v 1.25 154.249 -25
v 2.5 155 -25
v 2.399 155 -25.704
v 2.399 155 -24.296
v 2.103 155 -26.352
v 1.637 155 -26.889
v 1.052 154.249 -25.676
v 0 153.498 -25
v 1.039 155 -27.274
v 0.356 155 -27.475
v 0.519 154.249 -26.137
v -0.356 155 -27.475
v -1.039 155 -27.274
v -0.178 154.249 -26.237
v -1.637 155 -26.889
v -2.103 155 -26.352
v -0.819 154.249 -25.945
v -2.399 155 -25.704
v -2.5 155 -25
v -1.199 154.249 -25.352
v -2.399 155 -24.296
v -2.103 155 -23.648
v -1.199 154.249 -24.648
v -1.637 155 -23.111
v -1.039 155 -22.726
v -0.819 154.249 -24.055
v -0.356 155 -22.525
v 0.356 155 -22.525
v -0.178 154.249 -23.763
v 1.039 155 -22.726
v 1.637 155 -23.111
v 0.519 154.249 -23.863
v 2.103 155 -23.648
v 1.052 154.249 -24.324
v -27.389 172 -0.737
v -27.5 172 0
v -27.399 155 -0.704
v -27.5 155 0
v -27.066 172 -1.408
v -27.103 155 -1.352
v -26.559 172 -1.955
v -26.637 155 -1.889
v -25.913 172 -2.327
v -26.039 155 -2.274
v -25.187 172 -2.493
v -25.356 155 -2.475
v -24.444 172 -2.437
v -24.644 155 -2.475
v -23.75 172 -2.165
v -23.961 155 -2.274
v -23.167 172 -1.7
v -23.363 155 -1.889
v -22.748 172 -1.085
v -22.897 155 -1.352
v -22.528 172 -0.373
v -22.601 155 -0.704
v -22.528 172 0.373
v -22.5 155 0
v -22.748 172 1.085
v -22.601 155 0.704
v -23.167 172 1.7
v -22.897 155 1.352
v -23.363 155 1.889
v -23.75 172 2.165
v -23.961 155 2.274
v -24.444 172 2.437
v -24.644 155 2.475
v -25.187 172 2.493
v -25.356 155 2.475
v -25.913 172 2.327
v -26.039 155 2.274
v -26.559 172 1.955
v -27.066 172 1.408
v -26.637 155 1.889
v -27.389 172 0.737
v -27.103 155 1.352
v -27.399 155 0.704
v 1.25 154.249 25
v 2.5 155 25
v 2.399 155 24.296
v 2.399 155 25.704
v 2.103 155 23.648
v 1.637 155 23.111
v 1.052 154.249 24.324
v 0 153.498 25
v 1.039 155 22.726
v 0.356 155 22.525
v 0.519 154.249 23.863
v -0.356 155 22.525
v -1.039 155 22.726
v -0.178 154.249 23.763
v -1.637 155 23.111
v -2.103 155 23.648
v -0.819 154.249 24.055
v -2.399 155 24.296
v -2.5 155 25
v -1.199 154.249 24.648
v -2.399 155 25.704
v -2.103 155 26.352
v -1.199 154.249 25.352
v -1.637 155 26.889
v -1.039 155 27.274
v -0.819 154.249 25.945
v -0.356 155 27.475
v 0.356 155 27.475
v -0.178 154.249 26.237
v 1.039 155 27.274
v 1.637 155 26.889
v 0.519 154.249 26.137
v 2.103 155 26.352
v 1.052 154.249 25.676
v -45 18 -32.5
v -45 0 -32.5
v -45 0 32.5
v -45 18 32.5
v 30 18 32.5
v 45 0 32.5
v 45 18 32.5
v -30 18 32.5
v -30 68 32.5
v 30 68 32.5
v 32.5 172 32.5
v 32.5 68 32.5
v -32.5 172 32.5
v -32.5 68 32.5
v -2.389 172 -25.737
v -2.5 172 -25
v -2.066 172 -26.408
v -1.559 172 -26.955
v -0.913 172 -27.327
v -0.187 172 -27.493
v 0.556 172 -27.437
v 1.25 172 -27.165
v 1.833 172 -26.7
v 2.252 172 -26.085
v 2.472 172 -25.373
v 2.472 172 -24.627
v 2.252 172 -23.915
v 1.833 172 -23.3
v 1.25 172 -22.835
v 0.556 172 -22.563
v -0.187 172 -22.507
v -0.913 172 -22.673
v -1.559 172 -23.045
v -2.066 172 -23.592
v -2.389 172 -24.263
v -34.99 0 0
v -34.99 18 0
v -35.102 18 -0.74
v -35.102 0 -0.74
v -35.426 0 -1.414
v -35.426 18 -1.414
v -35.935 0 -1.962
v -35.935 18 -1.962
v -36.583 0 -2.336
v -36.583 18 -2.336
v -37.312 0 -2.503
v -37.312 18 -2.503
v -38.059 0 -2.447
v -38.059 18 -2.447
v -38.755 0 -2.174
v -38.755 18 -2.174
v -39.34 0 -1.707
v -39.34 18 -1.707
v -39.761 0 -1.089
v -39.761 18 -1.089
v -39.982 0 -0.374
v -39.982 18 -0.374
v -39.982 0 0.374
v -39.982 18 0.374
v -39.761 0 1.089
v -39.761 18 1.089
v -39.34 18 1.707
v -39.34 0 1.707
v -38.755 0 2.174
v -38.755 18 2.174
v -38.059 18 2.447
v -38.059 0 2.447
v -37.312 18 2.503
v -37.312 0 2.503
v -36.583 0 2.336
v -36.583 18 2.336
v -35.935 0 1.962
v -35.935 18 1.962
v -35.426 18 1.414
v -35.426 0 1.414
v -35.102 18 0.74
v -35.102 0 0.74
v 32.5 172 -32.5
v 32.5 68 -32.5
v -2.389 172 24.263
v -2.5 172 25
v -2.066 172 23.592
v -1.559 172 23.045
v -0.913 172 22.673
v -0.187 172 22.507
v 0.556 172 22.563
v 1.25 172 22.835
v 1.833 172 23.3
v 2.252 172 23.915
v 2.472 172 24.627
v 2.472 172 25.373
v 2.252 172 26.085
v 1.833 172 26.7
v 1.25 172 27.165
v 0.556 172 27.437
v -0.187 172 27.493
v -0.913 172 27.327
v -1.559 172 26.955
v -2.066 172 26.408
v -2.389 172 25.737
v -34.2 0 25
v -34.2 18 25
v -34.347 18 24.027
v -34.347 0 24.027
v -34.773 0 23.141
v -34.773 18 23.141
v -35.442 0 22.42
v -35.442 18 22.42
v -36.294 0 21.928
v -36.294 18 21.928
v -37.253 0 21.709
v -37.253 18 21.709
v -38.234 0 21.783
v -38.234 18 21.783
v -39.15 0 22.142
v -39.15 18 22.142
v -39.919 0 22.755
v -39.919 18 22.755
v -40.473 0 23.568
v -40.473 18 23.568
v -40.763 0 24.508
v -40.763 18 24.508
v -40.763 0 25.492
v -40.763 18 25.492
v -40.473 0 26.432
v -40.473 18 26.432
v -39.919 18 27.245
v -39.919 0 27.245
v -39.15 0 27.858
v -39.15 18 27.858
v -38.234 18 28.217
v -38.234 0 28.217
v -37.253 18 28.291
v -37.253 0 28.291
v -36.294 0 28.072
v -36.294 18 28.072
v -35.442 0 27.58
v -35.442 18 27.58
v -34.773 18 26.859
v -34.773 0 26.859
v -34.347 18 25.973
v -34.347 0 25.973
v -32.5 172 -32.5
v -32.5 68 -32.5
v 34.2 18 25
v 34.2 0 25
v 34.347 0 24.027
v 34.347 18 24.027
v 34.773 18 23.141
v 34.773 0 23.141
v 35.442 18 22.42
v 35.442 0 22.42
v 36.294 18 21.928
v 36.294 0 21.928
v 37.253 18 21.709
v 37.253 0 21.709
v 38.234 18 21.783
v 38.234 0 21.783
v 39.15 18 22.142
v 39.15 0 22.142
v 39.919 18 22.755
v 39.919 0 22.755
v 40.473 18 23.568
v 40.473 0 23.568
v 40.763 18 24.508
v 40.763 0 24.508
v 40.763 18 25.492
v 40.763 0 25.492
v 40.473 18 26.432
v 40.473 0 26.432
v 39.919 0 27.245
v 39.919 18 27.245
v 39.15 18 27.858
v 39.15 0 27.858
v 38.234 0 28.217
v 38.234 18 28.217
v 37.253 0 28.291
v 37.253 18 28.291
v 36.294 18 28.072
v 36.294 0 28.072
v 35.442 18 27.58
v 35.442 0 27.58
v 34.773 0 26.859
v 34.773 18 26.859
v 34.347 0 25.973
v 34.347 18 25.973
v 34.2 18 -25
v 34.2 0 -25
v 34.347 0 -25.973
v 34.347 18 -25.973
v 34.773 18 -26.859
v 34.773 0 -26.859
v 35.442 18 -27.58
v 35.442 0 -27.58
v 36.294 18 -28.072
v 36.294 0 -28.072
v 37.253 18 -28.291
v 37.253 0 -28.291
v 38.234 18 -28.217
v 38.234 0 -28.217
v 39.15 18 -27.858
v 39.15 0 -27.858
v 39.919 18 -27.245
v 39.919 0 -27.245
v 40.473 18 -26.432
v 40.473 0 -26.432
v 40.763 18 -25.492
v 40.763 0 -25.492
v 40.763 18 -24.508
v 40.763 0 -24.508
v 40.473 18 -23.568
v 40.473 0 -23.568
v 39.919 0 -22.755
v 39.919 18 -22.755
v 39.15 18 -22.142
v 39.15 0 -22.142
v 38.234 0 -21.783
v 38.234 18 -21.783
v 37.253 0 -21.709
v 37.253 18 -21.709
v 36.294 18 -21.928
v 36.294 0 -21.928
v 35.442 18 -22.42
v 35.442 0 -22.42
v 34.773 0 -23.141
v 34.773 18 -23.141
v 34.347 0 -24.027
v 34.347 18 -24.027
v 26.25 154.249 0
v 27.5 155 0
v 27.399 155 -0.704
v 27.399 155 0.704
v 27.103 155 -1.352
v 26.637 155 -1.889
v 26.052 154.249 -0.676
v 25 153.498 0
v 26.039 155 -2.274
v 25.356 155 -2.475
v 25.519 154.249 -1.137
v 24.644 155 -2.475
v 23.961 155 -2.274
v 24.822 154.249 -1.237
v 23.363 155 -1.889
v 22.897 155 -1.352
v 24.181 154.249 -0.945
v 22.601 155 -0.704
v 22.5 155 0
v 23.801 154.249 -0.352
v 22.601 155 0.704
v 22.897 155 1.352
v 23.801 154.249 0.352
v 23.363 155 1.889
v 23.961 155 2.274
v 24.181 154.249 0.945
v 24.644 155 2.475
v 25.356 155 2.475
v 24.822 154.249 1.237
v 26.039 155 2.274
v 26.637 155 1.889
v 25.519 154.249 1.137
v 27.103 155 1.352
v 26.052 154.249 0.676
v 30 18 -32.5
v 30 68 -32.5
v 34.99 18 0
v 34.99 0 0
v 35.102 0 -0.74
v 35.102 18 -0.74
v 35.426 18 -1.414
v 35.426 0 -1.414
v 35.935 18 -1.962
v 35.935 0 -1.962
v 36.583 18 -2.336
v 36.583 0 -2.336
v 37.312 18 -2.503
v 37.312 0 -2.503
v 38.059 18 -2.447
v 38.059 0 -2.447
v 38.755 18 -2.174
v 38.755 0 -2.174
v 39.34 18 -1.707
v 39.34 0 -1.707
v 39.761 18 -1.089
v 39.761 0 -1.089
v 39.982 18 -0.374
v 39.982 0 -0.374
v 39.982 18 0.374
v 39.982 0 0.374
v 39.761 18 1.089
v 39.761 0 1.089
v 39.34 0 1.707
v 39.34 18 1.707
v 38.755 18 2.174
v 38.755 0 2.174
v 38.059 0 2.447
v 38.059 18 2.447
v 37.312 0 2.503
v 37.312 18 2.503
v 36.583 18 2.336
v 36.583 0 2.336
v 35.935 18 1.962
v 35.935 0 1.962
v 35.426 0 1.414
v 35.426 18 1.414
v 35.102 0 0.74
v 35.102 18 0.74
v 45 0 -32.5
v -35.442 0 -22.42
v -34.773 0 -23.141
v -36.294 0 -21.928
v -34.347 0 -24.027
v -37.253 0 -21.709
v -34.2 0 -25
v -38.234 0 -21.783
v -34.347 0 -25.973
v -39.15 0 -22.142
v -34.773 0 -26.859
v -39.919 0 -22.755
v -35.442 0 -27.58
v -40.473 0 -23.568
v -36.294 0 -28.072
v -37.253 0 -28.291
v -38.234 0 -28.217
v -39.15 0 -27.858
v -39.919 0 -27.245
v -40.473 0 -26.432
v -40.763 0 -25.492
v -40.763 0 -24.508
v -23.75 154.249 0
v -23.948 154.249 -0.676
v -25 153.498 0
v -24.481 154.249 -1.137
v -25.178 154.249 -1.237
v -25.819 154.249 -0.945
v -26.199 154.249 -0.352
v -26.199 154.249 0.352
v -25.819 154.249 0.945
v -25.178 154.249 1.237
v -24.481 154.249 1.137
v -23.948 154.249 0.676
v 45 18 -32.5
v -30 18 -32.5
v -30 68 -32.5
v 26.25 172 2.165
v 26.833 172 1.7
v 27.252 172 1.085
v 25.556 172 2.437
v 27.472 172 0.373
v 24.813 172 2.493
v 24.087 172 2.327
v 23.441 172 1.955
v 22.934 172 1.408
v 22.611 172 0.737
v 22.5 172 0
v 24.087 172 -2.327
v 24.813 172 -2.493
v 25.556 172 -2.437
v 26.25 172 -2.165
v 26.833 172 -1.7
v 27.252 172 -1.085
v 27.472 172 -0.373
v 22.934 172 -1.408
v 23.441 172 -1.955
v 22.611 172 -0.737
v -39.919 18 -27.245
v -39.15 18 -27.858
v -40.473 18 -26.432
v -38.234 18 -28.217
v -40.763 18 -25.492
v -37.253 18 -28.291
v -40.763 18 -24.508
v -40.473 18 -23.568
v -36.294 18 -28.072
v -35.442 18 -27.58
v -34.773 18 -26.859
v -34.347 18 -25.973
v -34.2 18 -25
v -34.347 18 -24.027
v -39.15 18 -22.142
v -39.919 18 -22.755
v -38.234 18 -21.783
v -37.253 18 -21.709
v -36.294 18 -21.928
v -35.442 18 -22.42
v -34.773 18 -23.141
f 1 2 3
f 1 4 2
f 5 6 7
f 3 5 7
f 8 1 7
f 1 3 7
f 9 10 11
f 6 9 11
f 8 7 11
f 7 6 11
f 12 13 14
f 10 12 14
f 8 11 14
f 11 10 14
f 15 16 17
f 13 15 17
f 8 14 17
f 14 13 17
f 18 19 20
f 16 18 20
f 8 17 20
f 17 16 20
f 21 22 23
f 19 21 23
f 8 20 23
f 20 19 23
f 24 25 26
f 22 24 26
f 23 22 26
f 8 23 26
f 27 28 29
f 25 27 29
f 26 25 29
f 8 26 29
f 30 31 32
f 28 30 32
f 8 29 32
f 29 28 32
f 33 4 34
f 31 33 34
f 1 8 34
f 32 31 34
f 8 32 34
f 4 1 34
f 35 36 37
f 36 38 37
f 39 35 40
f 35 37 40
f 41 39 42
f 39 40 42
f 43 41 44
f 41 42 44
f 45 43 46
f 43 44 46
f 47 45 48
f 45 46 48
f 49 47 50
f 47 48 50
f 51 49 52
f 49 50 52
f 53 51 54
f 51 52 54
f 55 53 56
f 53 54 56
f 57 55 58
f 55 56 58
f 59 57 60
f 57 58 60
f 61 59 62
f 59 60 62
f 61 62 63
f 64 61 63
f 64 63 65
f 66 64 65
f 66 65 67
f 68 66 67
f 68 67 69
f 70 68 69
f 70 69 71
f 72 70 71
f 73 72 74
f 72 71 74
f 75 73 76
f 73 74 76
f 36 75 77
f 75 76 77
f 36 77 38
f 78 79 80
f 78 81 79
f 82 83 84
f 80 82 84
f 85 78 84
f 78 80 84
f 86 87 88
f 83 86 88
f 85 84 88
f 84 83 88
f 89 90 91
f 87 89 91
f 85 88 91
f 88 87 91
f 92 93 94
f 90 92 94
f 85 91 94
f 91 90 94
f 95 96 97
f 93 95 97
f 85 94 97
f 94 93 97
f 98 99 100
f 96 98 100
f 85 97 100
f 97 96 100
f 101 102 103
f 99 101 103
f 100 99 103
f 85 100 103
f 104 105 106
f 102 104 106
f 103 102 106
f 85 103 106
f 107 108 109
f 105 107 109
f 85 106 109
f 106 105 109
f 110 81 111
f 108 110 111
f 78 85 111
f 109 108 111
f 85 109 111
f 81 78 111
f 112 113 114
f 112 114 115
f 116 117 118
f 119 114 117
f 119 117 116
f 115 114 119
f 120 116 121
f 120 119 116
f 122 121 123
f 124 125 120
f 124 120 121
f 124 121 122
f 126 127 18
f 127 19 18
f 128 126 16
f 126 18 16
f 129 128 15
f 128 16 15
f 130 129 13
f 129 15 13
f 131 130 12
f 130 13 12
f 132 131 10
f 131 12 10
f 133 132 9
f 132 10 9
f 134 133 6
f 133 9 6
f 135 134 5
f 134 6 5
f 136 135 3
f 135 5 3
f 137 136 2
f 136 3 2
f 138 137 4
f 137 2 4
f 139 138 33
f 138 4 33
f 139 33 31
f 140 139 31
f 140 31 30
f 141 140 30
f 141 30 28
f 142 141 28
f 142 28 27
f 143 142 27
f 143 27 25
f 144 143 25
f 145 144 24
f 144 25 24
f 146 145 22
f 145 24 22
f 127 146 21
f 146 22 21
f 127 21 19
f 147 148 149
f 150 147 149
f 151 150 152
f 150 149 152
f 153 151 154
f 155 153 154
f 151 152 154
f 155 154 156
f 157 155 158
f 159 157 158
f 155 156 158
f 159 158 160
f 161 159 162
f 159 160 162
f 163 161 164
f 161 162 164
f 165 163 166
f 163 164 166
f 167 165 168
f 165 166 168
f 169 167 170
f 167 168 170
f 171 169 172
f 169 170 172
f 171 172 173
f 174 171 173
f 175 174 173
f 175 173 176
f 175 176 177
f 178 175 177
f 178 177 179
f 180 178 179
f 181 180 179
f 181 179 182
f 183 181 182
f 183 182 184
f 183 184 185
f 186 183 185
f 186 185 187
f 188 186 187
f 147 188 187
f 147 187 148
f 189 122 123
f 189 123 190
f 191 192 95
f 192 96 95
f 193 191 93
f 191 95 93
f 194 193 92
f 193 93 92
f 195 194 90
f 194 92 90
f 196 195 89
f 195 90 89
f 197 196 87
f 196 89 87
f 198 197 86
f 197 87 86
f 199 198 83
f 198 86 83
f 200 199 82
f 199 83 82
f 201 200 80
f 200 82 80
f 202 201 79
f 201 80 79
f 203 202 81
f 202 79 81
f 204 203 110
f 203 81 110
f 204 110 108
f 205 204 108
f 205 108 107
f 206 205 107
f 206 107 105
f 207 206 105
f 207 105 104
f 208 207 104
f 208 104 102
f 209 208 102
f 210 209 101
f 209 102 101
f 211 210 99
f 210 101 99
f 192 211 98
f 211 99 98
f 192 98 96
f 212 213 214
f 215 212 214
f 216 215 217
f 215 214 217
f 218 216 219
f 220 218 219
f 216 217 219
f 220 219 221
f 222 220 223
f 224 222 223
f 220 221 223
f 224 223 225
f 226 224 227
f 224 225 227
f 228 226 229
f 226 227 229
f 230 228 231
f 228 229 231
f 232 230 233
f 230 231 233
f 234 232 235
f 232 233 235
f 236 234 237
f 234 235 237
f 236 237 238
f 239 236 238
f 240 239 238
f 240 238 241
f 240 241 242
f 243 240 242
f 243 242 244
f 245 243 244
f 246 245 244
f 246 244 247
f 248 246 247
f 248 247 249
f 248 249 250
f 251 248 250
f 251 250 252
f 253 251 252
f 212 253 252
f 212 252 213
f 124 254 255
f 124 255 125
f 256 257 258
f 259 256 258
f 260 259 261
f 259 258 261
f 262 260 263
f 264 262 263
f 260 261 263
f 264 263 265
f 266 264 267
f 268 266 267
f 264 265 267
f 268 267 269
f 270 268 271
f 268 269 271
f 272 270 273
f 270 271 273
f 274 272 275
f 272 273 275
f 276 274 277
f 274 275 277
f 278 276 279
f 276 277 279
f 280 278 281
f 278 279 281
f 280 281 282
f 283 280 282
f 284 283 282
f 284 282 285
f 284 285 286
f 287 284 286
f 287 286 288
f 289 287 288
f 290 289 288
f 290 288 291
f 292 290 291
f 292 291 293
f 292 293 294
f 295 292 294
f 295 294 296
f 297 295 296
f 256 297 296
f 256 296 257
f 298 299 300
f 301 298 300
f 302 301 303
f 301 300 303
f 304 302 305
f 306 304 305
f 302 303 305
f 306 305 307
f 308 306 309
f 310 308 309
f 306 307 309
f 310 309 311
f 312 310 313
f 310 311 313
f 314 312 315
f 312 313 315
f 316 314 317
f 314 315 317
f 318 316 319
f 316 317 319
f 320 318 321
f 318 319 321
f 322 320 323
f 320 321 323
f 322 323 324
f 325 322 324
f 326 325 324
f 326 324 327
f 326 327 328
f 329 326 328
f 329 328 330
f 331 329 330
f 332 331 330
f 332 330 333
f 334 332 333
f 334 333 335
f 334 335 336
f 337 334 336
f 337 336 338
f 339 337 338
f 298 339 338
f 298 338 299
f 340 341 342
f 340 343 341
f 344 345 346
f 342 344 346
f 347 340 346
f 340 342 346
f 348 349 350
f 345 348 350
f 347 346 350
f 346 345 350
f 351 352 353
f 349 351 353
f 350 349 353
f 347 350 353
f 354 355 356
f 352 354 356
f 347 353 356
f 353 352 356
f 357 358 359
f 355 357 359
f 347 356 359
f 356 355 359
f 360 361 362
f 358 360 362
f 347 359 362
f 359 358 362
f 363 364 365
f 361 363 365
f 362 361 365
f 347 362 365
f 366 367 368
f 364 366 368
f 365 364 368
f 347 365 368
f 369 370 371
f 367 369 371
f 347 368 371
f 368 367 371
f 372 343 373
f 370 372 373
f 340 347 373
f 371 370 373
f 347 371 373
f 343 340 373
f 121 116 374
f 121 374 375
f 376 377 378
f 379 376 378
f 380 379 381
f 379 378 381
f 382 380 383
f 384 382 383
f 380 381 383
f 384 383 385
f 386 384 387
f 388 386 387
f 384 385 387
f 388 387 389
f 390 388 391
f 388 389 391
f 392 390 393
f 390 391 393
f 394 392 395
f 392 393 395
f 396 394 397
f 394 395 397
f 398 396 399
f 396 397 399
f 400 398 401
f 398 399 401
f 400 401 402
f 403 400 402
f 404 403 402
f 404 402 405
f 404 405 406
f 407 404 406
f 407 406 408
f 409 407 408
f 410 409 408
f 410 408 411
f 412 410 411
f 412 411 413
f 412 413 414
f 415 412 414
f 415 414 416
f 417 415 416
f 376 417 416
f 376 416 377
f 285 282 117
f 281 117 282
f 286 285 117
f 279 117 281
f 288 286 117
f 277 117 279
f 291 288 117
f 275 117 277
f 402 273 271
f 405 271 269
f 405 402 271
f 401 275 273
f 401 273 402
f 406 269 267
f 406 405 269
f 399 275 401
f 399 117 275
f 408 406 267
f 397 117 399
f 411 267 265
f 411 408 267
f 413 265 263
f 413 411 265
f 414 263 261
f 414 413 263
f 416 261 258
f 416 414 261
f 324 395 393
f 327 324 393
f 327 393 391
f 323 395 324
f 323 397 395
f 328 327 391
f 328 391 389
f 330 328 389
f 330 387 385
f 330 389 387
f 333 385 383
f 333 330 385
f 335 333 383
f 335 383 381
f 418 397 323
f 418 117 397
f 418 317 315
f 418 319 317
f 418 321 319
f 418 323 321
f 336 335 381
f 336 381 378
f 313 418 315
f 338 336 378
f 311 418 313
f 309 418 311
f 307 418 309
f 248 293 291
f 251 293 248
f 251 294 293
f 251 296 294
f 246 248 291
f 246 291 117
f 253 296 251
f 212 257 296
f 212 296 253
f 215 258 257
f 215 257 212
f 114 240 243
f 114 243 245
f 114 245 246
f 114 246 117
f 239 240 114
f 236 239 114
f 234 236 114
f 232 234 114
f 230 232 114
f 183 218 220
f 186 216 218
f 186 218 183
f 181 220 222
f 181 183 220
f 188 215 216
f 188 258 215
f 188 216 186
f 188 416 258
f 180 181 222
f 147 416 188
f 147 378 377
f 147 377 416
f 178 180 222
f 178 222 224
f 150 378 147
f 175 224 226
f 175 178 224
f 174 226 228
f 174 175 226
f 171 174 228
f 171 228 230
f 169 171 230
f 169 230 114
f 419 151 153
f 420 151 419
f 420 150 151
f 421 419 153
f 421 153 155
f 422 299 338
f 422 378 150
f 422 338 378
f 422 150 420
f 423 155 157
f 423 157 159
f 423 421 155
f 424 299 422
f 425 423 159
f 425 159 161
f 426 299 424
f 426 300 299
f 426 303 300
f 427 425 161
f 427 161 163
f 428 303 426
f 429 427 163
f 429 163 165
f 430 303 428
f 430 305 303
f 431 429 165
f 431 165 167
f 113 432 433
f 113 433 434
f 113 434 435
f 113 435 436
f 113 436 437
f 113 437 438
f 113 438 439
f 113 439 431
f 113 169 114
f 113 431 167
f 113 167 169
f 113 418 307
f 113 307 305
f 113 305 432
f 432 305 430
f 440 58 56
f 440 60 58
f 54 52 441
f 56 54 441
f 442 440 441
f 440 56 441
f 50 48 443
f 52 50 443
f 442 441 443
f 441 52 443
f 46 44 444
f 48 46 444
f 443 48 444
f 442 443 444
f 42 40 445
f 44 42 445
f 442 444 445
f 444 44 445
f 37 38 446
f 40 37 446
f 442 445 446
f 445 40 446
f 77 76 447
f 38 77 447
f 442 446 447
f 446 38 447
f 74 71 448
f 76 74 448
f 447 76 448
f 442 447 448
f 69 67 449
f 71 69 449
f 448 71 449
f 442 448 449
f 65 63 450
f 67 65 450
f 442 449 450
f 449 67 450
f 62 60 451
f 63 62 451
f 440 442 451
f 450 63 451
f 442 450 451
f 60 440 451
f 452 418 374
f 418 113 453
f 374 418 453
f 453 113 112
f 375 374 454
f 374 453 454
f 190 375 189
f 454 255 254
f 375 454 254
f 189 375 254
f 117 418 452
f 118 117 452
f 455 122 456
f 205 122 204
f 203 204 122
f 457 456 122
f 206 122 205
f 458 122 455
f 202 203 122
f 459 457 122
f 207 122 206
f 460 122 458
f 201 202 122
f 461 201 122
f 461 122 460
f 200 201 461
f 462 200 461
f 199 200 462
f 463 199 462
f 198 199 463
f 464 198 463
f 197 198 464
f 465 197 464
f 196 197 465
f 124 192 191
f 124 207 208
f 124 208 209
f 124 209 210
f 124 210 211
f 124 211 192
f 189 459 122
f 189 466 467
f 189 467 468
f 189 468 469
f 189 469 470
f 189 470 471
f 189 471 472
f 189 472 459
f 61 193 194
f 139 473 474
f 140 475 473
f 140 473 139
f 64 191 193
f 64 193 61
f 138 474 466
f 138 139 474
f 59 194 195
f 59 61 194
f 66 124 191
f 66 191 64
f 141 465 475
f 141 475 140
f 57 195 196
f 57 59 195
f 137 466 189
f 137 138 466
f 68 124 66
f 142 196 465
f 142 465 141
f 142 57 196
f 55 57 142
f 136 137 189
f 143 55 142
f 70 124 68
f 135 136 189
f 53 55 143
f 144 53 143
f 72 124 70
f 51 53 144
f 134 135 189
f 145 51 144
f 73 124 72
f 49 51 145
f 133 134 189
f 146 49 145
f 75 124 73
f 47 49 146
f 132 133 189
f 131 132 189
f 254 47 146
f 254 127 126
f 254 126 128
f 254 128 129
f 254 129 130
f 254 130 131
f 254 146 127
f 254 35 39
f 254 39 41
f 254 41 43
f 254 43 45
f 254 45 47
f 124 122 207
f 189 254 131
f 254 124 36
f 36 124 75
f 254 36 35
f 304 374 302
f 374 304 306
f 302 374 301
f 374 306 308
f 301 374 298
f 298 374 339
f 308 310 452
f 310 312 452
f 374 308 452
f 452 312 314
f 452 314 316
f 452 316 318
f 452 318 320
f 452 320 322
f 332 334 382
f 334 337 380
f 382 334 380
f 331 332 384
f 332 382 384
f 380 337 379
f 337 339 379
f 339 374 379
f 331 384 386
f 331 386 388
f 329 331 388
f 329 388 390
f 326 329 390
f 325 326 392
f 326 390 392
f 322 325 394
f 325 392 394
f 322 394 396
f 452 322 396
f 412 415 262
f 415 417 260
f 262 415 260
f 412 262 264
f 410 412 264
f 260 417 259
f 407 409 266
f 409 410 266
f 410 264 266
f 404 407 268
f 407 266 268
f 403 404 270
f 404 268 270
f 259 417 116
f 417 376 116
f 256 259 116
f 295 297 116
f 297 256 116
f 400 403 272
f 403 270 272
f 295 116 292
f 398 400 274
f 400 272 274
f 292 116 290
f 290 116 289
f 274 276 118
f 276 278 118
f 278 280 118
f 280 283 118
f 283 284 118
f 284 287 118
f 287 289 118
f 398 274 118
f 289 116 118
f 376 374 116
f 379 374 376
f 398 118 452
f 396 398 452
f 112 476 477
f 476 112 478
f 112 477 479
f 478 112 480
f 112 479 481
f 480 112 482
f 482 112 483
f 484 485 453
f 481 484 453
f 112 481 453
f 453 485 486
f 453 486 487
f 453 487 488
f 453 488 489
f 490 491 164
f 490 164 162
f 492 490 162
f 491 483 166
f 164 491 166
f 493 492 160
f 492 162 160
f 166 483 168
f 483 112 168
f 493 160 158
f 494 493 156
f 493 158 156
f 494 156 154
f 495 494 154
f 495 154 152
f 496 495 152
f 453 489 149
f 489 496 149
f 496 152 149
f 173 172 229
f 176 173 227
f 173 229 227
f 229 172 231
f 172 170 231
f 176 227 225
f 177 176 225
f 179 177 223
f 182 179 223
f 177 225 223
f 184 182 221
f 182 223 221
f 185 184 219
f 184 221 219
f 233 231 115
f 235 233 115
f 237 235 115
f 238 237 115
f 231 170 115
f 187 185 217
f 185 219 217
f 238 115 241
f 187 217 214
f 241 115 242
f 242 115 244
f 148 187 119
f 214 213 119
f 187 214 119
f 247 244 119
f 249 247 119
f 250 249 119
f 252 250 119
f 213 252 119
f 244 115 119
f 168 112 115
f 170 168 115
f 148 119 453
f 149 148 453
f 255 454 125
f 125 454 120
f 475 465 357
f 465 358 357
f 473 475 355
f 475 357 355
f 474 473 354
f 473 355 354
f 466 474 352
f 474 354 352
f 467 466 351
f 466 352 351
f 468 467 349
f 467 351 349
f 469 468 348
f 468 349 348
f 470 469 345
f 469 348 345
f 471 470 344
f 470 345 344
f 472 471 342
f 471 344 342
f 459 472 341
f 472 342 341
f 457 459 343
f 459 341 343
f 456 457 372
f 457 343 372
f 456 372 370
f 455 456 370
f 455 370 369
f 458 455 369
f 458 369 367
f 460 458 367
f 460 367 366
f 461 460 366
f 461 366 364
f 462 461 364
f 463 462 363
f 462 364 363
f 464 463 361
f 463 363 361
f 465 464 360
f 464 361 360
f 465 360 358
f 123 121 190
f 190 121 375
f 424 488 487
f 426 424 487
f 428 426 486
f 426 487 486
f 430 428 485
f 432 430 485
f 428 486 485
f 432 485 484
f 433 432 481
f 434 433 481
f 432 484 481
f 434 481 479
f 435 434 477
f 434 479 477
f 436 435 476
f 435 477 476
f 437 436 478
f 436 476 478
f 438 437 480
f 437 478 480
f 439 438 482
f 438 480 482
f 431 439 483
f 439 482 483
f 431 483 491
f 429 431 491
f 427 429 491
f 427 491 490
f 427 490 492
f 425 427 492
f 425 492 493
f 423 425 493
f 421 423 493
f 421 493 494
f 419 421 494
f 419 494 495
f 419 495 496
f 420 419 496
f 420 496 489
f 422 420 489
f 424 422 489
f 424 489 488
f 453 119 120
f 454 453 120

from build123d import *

# Parameters (mm, degrees)
SKIZZE1_W                            = 90
SKIZZE1_H                            = 172
AUFSATZ_LINEAR_AUSTRAGEN1_DEPTH      = 65
SKIZZE2_W                            = 15
SKIZZE2_H                            = 154
SCHNITT_LINEAR_AUSTRAGEN1_DEPTH      = 190.298705754
SKIZZE3_W                            = 65
SKIZZE3_H                            = 104
AUFSATZ_LINEAR_AUSTRAGEN2_DEPTH      = 2.5
SKIZZE4_W                            = 15
SKIZZE4_H                            = 154
SCHNITT_LINEAR_AUSTRAGEN2_DEPTH      = 190.298705754
SKIZZE5_W                            = 65
SKIZZE5_H                            = 104
AUFSATZ_LINEAR_AUSTRAGEN3_DEPTH      = 2.5
F_6_6_6_6_DURCHMESSER_BOHRUNG1_D     = 6.6
F_6_6_6_6_DURCHMESSER_BOHRUNG1_DEPTH = 172
BOHRUNG1_D                           = 5.02
BOHRUNG1_DEPTH                       = 172
F_6_6_6_6_DURCHMESSER_BOHRUNG2_D     = 6.6
BOHRUNG2_D                           = 5.02
F_5_0_5_DURCHMESSER_BOHRUNG1_D       = 5
F_5_0_5_DURCHMESSER_BOHRUNG1_DEPTH   = 17
F_5_0_5_DURCHMESSER_BOHRUNG1_TIP     = 1.502151548


with BuildPart() as part:
    # Skizze1 → Aufsatz-Linear austragen1 (new body)
    with BuildSketch(Plane(origin=(0, 0, -32.5), x_dir=(-1, 0, 0), z_dir=(0, 0, -1))):
        with Locations((0, 86)):
            Rectangle(SKIZZE1_W, SKIZZE1_H)
    extrude(amount=-AUFSATZ_LINEAR_AUSTRAGEN1_DEPTH)

    # Skizze2 → Schnitt-Linear austragen1 (cut, through all)
    with BuildSketch(Plane.XY.offset(32.5)):
        with Locations((-37.5, 95)):
            Rectangle(SKIZZE2_W, SKIZZE2_H)
    extrude(amount=-SCHNITT_LINEAR_AUSTRAGEN1_DEPTH, mode=Mode.SUBTRACT)

    # Skizze3 → Aufsatz-Linear austragen2 (add)
    with BuildSketch(Plane.ZY.offset(30)):
        with Locations((0, 120)):
            Rectangle(SKIZZE3_W, SKIZZE3_H)
    extrude(amount=AUFSATZ_LINEAR_AUSTRAGEN2_DEPTH)

    # Skizze4 → Schnitt-Linear austragen2 (cut, through all)
    with BuildSketch(Plane.XY.offset(32.5)):
        with Locations((37.5, 95)):
            Rectangle(SKIZZE4_W, SKIZZE4_H)
    extrude(amount=-SCHNITT_LINEAR_AUSTRAGEN2_DEPTH, mode=Mode.SUBTRACT)

    # Skizze5 → Aufsatz-Linear austragen3 (add)
    with BuildSketch(Plane(origin=(30, 0, 0), x_dir=(0, 0, -1), z_dir=(1, 0, 0))):
        with Locations((0, 120)):
            Rectangle(SKIZZE5_W, SKIZZE5_H)
    extrude(amount=AUFSATZ_LINEAR_AUSTRAGEN3_DEPTH)

    # Ø6.6 (6.6) Durchmesser Bohrung1
    with Locations(Plane(origin=(0, 0, 0), x_dir=(-1, 0, 0), z_dir=(0, -1, 0))):
        with Locations((37.5, -25), (37.5, 25)):
            Hole(F_6_6_6_6_DURCHMESSER_BOHRUNG1_D / 2, depth=F_6_6_6_6_DURCHMESSER_BOHRUNG1_DEPTH)

    # Bohrung1
    with Locations(Plane(origin=(0, 0, 0), x_dir=(-1, 0, 0), z_dir=(0, -1, 0))):
        with Locations((37.5, 0)):
            Hole(BOHRUNG1_D / 2, depth=BOHRUNG1_DEPTH)

    # Ø6.6 (6.6) Durchmesser Bohrung2 (through all)
    with Locations(Plane(origin=(0, 18, 0), x_dir=(1, 0, 0), z_dir=(0, 1, 0))):
        with Locations((37.5, 25), (37.5, -25)):
            Hole(F_6_6_6_6_DURCHMESSER_BOHRUNG2_D / 2)

    # Bohrung2 (through all)
    with Locations(Plane(origin=(0, 18, 0), x_dir=(1, 0, 0), z_dir=(0, 1, 0))):
        with Locations((37.5, 0)):
            Hole(BOHRUNG2_D / 2)

    # Ø5.0 (5) Durchmesser Bohrung1
    with Locations(Plane(origin=(0, 172, 0), x_dir=(1, 0, 0), z_dir=(0, 1, 0))):
        with Locations((-25, 0), (25, 0), (0, 25), (0, -25)):
            Hole(F_5_0_5_DURCHMESSER_BOHRUNG1_D / 2, depth=F_5_0_5_DURCHMESSER_BOHRUNG1_DEPTH)
            with Locations((0, 0, -(F_5_0_5_DURCHMESSER_BOHRUNG1_DEPTH + F_5_0_5_DURCHMESSER_BOHRUNG1_TIP / 2))):  # 118° drill point
                Cone(0, F_5_0_5_DURCHMESSER_BOHRUNG1_D / 2, F_5_0_5_DURCHMESSER_BOHRUNG1_TIP, mode=Mode.SUBTRACT)


solid = part.part
